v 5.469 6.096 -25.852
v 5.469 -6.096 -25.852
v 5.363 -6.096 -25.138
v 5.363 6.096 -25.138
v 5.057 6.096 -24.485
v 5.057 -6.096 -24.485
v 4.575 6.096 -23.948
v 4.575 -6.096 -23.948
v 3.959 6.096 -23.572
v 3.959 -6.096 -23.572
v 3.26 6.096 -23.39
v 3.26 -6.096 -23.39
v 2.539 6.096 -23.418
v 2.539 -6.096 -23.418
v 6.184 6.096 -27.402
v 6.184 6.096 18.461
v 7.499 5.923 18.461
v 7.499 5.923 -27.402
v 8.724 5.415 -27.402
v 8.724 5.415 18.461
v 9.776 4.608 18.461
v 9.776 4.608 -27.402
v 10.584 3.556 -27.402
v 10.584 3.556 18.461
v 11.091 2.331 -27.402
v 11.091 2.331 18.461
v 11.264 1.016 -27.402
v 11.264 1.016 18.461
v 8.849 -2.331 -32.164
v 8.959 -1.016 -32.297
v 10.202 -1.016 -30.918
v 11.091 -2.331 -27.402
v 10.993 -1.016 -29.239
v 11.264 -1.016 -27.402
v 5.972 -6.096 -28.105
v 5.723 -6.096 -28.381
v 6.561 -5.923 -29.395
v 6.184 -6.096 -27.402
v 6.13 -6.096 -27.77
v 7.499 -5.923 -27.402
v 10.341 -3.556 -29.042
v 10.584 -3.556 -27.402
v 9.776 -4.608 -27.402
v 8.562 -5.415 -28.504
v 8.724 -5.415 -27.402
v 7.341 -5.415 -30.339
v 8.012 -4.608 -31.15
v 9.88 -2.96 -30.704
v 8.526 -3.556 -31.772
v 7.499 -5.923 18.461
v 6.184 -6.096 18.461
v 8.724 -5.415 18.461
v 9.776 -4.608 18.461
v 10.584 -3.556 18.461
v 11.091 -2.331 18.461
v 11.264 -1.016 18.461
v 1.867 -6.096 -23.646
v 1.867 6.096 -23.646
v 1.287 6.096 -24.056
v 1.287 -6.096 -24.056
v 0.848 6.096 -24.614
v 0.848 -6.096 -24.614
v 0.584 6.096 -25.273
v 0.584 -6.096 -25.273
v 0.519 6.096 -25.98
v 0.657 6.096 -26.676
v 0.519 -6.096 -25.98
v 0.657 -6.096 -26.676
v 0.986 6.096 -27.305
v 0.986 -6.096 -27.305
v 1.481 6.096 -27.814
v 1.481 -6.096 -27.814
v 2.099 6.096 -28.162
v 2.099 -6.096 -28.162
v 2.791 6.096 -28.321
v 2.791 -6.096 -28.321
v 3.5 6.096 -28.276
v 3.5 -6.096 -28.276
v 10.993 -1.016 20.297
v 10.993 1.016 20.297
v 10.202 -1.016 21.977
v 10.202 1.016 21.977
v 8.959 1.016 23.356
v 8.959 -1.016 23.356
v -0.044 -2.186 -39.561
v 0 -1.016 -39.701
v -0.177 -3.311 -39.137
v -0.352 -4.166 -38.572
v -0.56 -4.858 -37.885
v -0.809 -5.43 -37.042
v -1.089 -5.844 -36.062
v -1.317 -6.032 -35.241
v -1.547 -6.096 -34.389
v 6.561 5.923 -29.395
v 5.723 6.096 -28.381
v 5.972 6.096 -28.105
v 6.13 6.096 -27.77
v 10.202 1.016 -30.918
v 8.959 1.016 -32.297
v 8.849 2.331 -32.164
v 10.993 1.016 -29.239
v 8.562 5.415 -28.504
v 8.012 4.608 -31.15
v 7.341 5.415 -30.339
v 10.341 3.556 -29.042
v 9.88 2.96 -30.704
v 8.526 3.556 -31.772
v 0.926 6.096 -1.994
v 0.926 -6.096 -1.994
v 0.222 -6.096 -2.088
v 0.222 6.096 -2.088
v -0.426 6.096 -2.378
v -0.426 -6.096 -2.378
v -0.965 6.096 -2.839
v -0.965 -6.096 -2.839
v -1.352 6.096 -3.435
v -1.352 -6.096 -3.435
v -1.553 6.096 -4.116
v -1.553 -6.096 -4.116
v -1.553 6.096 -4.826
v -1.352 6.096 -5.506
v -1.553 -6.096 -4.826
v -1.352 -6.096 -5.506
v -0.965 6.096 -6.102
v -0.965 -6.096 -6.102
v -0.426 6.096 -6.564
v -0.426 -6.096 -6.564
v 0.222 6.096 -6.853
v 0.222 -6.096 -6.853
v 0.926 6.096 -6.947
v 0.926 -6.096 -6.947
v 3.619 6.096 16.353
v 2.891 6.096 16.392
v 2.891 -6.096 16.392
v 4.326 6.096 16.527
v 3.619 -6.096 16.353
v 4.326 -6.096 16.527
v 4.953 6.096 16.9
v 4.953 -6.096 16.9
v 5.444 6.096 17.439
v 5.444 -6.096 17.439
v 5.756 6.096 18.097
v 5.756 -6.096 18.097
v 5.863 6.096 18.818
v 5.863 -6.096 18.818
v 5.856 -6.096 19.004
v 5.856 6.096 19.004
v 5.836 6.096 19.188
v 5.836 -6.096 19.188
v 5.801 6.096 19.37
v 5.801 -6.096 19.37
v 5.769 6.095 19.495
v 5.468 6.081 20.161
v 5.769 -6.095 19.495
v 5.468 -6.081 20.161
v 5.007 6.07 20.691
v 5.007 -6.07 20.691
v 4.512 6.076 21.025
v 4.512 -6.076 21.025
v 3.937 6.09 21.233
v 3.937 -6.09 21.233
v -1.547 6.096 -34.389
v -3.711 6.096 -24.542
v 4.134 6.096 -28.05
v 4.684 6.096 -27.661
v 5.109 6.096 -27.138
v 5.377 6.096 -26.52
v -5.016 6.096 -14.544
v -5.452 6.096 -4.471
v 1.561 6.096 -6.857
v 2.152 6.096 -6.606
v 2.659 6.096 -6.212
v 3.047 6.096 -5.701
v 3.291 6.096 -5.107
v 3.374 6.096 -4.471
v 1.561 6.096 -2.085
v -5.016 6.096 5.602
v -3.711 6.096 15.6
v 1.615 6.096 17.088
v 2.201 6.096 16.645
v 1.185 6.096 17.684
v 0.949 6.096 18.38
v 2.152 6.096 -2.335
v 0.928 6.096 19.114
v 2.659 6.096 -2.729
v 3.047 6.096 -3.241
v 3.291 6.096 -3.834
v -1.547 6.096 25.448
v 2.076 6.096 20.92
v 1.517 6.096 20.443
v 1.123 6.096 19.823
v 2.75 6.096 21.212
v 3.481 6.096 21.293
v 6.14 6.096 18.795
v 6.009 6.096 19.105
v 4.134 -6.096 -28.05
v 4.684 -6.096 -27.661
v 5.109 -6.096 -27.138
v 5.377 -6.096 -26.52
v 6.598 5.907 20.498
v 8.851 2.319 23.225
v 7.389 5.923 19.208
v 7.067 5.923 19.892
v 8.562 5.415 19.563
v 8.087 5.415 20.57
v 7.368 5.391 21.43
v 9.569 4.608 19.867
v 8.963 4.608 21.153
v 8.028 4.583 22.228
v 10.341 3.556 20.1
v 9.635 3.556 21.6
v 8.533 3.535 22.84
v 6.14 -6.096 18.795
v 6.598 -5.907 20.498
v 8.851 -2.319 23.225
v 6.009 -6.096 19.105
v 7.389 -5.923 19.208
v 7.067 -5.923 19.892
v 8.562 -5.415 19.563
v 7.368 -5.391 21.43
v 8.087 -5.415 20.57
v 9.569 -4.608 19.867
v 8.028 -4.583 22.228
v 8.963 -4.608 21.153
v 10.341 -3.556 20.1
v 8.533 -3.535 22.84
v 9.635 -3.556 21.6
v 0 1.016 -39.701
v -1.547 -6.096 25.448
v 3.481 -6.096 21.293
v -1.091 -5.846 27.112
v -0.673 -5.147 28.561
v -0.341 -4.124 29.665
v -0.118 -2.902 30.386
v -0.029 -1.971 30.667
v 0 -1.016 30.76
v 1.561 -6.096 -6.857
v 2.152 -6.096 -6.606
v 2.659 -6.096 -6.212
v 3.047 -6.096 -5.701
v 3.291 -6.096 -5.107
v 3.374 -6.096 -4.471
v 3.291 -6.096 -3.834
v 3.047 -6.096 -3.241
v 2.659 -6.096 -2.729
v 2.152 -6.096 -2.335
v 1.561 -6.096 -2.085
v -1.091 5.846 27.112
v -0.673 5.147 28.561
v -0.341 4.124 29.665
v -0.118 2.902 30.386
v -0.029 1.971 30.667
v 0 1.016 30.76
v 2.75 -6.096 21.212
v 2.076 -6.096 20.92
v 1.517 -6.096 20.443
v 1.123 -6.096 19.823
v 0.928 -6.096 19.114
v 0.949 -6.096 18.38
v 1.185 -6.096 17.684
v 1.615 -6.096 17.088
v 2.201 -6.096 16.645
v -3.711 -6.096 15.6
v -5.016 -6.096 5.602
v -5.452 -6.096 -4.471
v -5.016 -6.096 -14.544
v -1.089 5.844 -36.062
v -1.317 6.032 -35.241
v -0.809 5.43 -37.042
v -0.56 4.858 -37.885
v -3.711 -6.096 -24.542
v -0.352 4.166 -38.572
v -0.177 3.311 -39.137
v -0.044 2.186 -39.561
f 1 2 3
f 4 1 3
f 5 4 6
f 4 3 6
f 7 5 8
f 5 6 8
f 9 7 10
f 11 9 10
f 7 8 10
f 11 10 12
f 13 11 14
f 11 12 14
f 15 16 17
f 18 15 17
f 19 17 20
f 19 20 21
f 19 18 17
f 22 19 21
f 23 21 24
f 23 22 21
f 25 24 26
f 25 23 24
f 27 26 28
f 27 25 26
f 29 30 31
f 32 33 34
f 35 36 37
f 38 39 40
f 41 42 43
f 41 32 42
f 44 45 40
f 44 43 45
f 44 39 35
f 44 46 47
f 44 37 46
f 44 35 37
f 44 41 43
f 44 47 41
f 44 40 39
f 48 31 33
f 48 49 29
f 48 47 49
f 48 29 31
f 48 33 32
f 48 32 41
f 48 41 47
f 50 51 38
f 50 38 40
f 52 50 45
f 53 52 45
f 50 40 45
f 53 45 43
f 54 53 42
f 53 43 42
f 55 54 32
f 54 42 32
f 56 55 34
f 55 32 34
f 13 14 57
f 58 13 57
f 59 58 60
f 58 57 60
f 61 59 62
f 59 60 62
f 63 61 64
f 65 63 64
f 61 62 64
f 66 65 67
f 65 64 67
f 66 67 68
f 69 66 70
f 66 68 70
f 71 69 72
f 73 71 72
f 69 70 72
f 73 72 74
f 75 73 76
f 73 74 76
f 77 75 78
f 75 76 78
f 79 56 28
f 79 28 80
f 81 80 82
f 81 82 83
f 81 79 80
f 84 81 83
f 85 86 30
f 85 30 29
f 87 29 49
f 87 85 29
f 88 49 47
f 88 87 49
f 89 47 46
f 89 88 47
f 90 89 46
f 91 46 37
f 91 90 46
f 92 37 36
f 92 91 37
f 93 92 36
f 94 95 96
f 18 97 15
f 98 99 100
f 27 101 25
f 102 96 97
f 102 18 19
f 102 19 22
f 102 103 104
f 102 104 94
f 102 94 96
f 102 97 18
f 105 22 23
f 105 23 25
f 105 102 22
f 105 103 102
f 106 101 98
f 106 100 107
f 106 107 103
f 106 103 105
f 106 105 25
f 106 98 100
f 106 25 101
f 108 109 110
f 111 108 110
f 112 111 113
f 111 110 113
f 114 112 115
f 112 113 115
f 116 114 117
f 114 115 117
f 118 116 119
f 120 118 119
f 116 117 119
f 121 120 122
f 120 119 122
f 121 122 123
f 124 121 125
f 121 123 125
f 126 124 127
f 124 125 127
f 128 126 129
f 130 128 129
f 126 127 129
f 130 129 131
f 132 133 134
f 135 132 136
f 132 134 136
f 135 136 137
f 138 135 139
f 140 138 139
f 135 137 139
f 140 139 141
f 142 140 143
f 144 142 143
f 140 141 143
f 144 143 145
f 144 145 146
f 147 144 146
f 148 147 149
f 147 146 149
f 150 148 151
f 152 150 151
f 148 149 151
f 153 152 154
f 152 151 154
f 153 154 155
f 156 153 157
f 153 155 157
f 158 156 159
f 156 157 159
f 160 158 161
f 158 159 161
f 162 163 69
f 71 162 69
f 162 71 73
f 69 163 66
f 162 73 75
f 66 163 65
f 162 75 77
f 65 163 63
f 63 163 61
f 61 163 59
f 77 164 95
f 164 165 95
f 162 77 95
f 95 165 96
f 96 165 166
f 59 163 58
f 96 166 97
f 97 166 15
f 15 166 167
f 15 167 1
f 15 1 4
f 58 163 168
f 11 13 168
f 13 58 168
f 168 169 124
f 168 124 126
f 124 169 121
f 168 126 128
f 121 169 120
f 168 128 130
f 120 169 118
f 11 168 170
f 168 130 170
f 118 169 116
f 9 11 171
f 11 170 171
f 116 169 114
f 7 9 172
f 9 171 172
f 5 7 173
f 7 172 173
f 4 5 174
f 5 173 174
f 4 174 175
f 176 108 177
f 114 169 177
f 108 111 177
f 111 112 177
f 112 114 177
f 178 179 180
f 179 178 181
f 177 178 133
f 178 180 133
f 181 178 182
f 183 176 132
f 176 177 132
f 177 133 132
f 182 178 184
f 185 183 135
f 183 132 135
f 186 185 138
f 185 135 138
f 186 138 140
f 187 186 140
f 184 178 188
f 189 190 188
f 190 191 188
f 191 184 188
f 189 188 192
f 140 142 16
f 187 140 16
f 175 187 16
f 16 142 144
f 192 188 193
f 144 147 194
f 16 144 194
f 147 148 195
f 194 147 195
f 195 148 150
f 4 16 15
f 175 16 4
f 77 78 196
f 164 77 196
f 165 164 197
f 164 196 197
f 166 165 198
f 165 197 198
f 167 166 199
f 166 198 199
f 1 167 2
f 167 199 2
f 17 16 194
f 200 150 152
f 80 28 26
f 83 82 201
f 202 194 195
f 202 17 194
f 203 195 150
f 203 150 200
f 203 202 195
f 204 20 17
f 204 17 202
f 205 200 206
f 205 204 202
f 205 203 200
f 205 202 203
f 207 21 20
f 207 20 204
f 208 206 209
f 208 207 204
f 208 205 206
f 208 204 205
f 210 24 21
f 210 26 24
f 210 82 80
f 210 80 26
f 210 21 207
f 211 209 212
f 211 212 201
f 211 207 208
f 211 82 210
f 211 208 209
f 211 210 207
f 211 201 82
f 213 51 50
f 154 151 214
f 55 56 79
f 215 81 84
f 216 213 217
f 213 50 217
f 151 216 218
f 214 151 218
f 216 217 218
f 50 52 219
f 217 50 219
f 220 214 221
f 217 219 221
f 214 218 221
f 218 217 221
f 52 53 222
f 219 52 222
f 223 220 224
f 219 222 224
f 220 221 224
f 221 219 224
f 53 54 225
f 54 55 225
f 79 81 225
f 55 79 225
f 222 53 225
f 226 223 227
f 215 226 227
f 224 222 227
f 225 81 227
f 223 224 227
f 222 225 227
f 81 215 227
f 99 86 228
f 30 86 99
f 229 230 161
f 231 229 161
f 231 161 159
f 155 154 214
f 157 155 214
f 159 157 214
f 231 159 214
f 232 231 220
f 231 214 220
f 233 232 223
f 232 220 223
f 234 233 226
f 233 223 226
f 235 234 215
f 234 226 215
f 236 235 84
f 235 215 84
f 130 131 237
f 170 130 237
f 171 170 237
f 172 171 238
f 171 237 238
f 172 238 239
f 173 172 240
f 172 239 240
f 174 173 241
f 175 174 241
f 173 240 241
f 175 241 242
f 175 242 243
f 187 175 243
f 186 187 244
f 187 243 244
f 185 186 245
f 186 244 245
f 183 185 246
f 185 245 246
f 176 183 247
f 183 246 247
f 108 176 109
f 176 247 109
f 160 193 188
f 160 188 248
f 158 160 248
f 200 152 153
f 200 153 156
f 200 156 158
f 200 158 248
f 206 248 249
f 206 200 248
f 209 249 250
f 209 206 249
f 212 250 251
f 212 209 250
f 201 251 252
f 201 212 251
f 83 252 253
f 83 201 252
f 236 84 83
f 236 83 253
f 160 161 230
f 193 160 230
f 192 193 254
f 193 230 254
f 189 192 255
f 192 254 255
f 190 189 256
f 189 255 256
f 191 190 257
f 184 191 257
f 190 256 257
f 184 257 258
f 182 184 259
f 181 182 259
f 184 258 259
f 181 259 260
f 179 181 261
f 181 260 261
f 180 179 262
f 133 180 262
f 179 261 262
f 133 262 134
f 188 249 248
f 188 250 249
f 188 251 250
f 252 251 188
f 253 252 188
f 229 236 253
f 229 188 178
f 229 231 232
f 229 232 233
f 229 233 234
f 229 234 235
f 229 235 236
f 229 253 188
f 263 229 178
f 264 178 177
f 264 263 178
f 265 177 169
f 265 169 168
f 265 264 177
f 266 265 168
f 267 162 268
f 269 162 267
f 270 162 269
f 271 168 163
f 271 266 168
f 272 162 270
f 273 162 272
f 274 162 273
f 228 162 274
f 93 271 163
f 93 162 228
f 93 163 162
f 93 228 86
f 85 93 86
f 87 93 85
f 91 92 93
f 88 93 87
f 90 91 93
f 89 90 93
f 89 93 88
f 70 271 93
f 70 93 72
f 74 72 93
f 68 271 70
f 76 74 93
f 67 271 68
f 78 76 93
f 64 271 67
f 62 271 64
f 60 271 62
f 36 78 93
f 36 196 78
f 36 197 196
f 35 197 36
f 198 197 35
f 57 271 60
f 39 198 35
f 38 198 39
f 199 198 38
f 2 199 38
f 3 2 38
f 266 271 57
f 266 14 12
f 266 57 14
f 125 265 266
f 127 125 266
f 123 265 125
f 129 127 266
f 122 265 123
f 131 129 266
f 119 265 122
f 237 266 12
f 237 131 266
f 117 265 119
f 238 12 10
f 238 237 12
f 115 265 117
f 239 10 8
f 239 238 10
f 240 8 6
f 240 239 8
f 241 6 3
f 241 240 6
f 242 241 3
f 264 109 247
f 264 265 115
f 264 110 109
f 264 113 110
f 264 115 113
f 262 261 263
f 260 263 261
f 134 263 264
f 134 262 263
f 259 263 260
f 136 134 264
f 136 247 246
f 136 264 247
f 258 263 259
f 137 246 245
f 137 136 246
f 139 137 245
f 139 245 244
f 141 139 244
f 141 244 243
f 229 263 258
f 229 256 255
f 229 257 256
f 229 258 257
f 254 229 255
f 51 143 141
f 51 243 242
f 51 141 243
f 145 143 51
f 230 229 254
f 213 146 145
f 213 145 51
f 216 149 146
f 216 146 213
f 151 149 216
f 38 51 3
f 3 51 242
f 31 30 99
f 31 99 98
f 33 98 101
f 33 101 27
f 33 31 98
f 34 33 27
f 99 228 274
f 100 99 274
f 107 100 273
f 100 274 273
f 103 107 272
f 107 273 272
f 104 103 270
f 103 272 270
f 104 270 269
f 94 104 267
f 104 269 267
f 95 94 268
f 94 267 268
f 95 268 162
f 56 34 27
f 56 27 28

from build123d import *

# Parameters (mm, degrees)
F1_DEPTH     = 6.096
F3_DEPTH     = 25.4
F4_T1_DEPTH  = 45.8630415712
F4_T3_DEPTH  = 24.3228960689
F4_T5_DEPTH  = 24.3228960689
F4_T8_ANGLE  = 50.429603728
F4_T10_ANGLE = 50.429603728
F4_T12_ANGLE = 50.429603728
F4_T14_ANGLE = 50.429603728


# Not quite as in the source:
# - a fillet or chamfer that OpenCascade refuses, or shapes differently, is made with other operations: its cross-section is extruded or revolved along the edge and cut away or added


with BuildPart() as f1:
    # F0 (on Front) → F1 (new body, symmetric)
    with BuildSketch(Plane.XZ):
        with BuildLine():
            Line((0, -39.7012000674), (8.9594220974, -32.2971154711))
            ThreePointArc((8.9594220974, -32.2971154711), (10.6592614203, -30.1074484367), (11.2643083058, -27.4022656866))
            Line((11.2643083058, -27.4022656866), (11.2643083058, 18.4607758846))
            ThreePointArc((11.2643083058, 18.4607758846), (10.6592614203, 21.1659586348), (8.9594220974, 23.3556256691))
            Line((8.9594220974, 23.3556256691), (0, 30.7597102655))
            ThreePointArc((0, 30.7597102655), (-5.4521439637, -4.470744901), (0, -39.7012000674))
        make_face()
    extrude(amount=F1_DEPTH, both=True)

    # F2 (on face) → F3 (cut)
    with BuildSketch(Plane.XZ.offset(6.096)):
        with BuildLine():
            ThreePointArc((5.8633539044, 18.8184664851), (5.322886305, 20.3627562227), (3.9373851632, 21.2329990657))
            ThreePointArc((3.9373851632, 21.2329990657), (3.3868539044, 18.8184664851), (2.8907187579, 16.3921725692))
            ThreePointArc((2.8907187579, 16.3921725692), (4.9527998741, 16.8999083103), (5.8633539044, 18.8184664851))
        make_face()
        with BuildLine():
            ThreePointArc((5.4685295173, -25.8524299357), (4.5748708681, -23.9477867911), (2.5388582003, -23.4177455604))
            ThreePointArc((2.5388582003, -23.4177455604), (2.9920295173, -25.8524299357), (3.4997963379, -28.2763162998))
            ThreePointArc((3.4997963379, -28.2763162998), (4.9143376067, -27.4137703405), (5.4685295173, -25.8524299357))
        make_face()
        with BuildLine():
            ThreePointArc((3.4997963379, -28.2763162998), (2.9920295173, -25.8524299357), (2.5388582003, -23.4177455604))
            ThreePointArc((2.5388582003, -23.4177455604), (0.5625907808, -26.3329293377), (3.4997963379, -28.2763162998))
        make_face()
        with BuildLine():
            ThreePointArc((3.3743560218, -4.470744901), (2.6588166523, -2.7294609185), (0.9256825651, -1.9944012387))
            ThreePointArc((0.9256825651, -1.9944012387), (0.8978560218, -4.470744901), (0.9256825651, -6.9470885632))
            ThreePointArc((0.9256825651, -6.9470885632), (2.6588166523, -6.2120288835), (3.3743560218, -4.470744901))
        make_face()
        with BuildLine():
            ThreePointArc((0.9256825651, -6.9470885632), (0.8978560218, -4.470744901), (0.9256825651, -1.9944012387))
            ThreePointArc((0.9256825651, -1.9944012387), (-1.5786439782, -4.470744901), (0.9256825651, -6.9470885632))
        make_face()
        with BuildLine():
            ThreePointArc((2.8907187579, 16.3921725692), (3.3868539044, 18.8184664851), (3.9373851632, 21.2329990657))
            ThreePointArc((3.9373851632, 21.2329990657), (0.9662878494, 19.3418327271), (2.8907187579, 16.3921725692))
        make_face()
    extrude(amount=-F3_DEPTH, mode=Mode.SUBTRACT)

    # F4: fillet of radius 5.08 on 10 edges, made by hand

    # F4_s2 → F4_t1 (cut)
    with BuildSketch(Plane.XY.offset(-27.4022656866)):
        with BuildLine():
            ThreePointArc((6.1843083058, -6.096), (9.7764107542, -4.6081024484), (11.2643083058, -1.016))
            Line((11.2643083058, -1.016), (11.2643083058, -6.096))
            Line((11.2643083058, -6.096), (6.1843083058, -6.096))
        make_face()
        with BuildLine():
            ThreePointArc((6.1843083058, 6.096), (9.7764107542, 4.6081024484), (11.2643083058, 1.016))
            Line((11.2643083058, 1.016), (11.2643083058, 6.096))
            Line((11.2643083058, 6.096), (6.1843083058, 6.096))
        make_face()
    extrude(amount=F4_T1_DEPTH, mode=Mode.SUBTRACT)

    # F4_s4 → F4_t3 (cut)
    with BuildSketch(Plane(origin=(-29.284836754, 0, -24.2010485008), x_dir=(0, 1, 0), z_dir=(0.7708424857, 0, 0.637025794))):
        with BuildLine():
            ThreePointArc((1.016, -30.6033717472), (4.6081024484, -29.1154741956), (6.096, -25.5233717472))
            Line((6.096, -25.5233717472), (6.096, -30.6033717472))
            Line((6.096, -30.6033717472), (1.016, -30.6033717472))
        make_face()
        with BuildLine():
            ThreePointArc((-1.016, -30.6033717472), (-4.6081024484, -29.1154741956), (-6.096, -25.5233717472))
            Line((-6.096, -25.5233717472), (-6.096, -30.6033717472))
            Line((-6.096, -30.6033717472), (-1.016, -30.6033717472))
        make_face()
    extrude(amount=F4_T3_DEPTH, mode=Mode.SUBTRACT)

    # F4_s6 → F4_t5 (cut)
    with BuildSketch(Plane(origin=(-6.1450273998, 0, 5.078263109), x_dir=(0, 1, 0), z_dir=(-0.7708424857, 0, 0.637025794))):
        with BuildLine():
            ThreePointArc((6.096, -18.630891522), (4.6081024484, -22.2229939704), (1.016, -23.710891522))
            Line((1.016, -23.710891522), (6.096, -23.710891522))
            Line((6.096, -23.710891522), (6.096, -18.630891522))
        make_face()
        with BuildLine():
            ThreePointArc((-6.096, -18.630891522), (-4.6081024484, -22.2229939704), (-1.016, -23.710891522))
            Line((-1.016, -23.710891522), (-6.096, -23.710891522))
            Line((-6.096, -23.710891522), (-6.096, -18.630891522))
        make_face()
    extrude(amount=F4_T5_DEPTH, mode=Mode.SUBTRACT)

    # F4_s7 → F4_t8 (revolve, cut)
    with BuildSketch(Plane(origin=(-10.5357150876, 0, -8.7067363212), x_dir=(0, 1, 0), z_dir=(-0.7708424857, 0, -0.637025794))):
        with BuildLine():
            ThreePointArc((6.096, 25.5233717472), (4.6081024484, 29.1154741956), (1.016, 30.6033717472))
            Line((1.016, 30.6033717472), (6.096, 30.6033717472))
            Line((6.096, 30.6033717472), (6.096, 25.5233717472))
        make_face()
    revolve(axis=Axis((4.9143083058, 6.096, -27.4022656866), (0, -1, 0)), revolution_arc=F4_T8_ANGLE, mode=Mode.SUBTRACT)

    # F4_s9 → F4_t10 (revolve, cut)
    with BuildSketch(Plane.XY.offset(18.4607758846)):
        with BuildLine():
            ThreePointArc((6.1843083058, 6.096), (9.7764107542, 4.6081024484), (11.2643083058, 1.016))
            Line((11.2643083058, 1.016), (11.2643083058, 6.096))
            Line((11.2643083058, 6.096), (6.1843083058, 6.096))
        make_face()
    revolve(axis=Axis((4.9143083058, 6.096, 18.4607758846), (0, -1, 0)), revolution_arc=F4_T10_ANGLE, mode=Mode.SUBTRACT)

    # F4_s11 → F4_t12 (revolve, cut)
    with BuildSketch(Plane(origin=(-10.5357150876, 0, -8.7067363212), x_dir=(0, 1, 0), z_dir=(-0.7708424857, 0, -0.637025794))):
        with BuildLine():
            ThreePointArc((-1.016, 30.6033717472), (-4.6081024484, 29.1154741956), (-6.096, 25.5233717472))
            Line((-6.096, 25.5233717472), (-6.096, 30.6033717472))
            Line((-6.096, 30.6033717472), (-1.016, 30.6033717472))
        make_face()
    revolve(axis=Axis((4.9143083058, -6.096, -27.4022656866), (0, -1, 0)), revolution_arc=F4_T12_ANGLE, mode=Mode.SUBTRACT)

    # F4_s13 → F4_t14 (revolve, cut)
    with BuildSketch(Plane.XY.offset(18.4607758846)):
        with BuildLine():
            ThreePointArc((6.1843083058, -6.096), (9.7764107542, -4.6081024484), (11.2643083058, -1.016))
            Line((11.2643083058, -1.016), (11.2643083058, -6.096))
            Line((11.2643083058, -6.096), (6.1843083058, -6.096))
        make_face()
    revolve(axis=Axis((4.9143083058, -6.096, 18.4607758846), (0, -1, 0)), revolution_arc=F4_T14_ANGLE, mode=Mode.SUBTRACT)


solid = f1.part
